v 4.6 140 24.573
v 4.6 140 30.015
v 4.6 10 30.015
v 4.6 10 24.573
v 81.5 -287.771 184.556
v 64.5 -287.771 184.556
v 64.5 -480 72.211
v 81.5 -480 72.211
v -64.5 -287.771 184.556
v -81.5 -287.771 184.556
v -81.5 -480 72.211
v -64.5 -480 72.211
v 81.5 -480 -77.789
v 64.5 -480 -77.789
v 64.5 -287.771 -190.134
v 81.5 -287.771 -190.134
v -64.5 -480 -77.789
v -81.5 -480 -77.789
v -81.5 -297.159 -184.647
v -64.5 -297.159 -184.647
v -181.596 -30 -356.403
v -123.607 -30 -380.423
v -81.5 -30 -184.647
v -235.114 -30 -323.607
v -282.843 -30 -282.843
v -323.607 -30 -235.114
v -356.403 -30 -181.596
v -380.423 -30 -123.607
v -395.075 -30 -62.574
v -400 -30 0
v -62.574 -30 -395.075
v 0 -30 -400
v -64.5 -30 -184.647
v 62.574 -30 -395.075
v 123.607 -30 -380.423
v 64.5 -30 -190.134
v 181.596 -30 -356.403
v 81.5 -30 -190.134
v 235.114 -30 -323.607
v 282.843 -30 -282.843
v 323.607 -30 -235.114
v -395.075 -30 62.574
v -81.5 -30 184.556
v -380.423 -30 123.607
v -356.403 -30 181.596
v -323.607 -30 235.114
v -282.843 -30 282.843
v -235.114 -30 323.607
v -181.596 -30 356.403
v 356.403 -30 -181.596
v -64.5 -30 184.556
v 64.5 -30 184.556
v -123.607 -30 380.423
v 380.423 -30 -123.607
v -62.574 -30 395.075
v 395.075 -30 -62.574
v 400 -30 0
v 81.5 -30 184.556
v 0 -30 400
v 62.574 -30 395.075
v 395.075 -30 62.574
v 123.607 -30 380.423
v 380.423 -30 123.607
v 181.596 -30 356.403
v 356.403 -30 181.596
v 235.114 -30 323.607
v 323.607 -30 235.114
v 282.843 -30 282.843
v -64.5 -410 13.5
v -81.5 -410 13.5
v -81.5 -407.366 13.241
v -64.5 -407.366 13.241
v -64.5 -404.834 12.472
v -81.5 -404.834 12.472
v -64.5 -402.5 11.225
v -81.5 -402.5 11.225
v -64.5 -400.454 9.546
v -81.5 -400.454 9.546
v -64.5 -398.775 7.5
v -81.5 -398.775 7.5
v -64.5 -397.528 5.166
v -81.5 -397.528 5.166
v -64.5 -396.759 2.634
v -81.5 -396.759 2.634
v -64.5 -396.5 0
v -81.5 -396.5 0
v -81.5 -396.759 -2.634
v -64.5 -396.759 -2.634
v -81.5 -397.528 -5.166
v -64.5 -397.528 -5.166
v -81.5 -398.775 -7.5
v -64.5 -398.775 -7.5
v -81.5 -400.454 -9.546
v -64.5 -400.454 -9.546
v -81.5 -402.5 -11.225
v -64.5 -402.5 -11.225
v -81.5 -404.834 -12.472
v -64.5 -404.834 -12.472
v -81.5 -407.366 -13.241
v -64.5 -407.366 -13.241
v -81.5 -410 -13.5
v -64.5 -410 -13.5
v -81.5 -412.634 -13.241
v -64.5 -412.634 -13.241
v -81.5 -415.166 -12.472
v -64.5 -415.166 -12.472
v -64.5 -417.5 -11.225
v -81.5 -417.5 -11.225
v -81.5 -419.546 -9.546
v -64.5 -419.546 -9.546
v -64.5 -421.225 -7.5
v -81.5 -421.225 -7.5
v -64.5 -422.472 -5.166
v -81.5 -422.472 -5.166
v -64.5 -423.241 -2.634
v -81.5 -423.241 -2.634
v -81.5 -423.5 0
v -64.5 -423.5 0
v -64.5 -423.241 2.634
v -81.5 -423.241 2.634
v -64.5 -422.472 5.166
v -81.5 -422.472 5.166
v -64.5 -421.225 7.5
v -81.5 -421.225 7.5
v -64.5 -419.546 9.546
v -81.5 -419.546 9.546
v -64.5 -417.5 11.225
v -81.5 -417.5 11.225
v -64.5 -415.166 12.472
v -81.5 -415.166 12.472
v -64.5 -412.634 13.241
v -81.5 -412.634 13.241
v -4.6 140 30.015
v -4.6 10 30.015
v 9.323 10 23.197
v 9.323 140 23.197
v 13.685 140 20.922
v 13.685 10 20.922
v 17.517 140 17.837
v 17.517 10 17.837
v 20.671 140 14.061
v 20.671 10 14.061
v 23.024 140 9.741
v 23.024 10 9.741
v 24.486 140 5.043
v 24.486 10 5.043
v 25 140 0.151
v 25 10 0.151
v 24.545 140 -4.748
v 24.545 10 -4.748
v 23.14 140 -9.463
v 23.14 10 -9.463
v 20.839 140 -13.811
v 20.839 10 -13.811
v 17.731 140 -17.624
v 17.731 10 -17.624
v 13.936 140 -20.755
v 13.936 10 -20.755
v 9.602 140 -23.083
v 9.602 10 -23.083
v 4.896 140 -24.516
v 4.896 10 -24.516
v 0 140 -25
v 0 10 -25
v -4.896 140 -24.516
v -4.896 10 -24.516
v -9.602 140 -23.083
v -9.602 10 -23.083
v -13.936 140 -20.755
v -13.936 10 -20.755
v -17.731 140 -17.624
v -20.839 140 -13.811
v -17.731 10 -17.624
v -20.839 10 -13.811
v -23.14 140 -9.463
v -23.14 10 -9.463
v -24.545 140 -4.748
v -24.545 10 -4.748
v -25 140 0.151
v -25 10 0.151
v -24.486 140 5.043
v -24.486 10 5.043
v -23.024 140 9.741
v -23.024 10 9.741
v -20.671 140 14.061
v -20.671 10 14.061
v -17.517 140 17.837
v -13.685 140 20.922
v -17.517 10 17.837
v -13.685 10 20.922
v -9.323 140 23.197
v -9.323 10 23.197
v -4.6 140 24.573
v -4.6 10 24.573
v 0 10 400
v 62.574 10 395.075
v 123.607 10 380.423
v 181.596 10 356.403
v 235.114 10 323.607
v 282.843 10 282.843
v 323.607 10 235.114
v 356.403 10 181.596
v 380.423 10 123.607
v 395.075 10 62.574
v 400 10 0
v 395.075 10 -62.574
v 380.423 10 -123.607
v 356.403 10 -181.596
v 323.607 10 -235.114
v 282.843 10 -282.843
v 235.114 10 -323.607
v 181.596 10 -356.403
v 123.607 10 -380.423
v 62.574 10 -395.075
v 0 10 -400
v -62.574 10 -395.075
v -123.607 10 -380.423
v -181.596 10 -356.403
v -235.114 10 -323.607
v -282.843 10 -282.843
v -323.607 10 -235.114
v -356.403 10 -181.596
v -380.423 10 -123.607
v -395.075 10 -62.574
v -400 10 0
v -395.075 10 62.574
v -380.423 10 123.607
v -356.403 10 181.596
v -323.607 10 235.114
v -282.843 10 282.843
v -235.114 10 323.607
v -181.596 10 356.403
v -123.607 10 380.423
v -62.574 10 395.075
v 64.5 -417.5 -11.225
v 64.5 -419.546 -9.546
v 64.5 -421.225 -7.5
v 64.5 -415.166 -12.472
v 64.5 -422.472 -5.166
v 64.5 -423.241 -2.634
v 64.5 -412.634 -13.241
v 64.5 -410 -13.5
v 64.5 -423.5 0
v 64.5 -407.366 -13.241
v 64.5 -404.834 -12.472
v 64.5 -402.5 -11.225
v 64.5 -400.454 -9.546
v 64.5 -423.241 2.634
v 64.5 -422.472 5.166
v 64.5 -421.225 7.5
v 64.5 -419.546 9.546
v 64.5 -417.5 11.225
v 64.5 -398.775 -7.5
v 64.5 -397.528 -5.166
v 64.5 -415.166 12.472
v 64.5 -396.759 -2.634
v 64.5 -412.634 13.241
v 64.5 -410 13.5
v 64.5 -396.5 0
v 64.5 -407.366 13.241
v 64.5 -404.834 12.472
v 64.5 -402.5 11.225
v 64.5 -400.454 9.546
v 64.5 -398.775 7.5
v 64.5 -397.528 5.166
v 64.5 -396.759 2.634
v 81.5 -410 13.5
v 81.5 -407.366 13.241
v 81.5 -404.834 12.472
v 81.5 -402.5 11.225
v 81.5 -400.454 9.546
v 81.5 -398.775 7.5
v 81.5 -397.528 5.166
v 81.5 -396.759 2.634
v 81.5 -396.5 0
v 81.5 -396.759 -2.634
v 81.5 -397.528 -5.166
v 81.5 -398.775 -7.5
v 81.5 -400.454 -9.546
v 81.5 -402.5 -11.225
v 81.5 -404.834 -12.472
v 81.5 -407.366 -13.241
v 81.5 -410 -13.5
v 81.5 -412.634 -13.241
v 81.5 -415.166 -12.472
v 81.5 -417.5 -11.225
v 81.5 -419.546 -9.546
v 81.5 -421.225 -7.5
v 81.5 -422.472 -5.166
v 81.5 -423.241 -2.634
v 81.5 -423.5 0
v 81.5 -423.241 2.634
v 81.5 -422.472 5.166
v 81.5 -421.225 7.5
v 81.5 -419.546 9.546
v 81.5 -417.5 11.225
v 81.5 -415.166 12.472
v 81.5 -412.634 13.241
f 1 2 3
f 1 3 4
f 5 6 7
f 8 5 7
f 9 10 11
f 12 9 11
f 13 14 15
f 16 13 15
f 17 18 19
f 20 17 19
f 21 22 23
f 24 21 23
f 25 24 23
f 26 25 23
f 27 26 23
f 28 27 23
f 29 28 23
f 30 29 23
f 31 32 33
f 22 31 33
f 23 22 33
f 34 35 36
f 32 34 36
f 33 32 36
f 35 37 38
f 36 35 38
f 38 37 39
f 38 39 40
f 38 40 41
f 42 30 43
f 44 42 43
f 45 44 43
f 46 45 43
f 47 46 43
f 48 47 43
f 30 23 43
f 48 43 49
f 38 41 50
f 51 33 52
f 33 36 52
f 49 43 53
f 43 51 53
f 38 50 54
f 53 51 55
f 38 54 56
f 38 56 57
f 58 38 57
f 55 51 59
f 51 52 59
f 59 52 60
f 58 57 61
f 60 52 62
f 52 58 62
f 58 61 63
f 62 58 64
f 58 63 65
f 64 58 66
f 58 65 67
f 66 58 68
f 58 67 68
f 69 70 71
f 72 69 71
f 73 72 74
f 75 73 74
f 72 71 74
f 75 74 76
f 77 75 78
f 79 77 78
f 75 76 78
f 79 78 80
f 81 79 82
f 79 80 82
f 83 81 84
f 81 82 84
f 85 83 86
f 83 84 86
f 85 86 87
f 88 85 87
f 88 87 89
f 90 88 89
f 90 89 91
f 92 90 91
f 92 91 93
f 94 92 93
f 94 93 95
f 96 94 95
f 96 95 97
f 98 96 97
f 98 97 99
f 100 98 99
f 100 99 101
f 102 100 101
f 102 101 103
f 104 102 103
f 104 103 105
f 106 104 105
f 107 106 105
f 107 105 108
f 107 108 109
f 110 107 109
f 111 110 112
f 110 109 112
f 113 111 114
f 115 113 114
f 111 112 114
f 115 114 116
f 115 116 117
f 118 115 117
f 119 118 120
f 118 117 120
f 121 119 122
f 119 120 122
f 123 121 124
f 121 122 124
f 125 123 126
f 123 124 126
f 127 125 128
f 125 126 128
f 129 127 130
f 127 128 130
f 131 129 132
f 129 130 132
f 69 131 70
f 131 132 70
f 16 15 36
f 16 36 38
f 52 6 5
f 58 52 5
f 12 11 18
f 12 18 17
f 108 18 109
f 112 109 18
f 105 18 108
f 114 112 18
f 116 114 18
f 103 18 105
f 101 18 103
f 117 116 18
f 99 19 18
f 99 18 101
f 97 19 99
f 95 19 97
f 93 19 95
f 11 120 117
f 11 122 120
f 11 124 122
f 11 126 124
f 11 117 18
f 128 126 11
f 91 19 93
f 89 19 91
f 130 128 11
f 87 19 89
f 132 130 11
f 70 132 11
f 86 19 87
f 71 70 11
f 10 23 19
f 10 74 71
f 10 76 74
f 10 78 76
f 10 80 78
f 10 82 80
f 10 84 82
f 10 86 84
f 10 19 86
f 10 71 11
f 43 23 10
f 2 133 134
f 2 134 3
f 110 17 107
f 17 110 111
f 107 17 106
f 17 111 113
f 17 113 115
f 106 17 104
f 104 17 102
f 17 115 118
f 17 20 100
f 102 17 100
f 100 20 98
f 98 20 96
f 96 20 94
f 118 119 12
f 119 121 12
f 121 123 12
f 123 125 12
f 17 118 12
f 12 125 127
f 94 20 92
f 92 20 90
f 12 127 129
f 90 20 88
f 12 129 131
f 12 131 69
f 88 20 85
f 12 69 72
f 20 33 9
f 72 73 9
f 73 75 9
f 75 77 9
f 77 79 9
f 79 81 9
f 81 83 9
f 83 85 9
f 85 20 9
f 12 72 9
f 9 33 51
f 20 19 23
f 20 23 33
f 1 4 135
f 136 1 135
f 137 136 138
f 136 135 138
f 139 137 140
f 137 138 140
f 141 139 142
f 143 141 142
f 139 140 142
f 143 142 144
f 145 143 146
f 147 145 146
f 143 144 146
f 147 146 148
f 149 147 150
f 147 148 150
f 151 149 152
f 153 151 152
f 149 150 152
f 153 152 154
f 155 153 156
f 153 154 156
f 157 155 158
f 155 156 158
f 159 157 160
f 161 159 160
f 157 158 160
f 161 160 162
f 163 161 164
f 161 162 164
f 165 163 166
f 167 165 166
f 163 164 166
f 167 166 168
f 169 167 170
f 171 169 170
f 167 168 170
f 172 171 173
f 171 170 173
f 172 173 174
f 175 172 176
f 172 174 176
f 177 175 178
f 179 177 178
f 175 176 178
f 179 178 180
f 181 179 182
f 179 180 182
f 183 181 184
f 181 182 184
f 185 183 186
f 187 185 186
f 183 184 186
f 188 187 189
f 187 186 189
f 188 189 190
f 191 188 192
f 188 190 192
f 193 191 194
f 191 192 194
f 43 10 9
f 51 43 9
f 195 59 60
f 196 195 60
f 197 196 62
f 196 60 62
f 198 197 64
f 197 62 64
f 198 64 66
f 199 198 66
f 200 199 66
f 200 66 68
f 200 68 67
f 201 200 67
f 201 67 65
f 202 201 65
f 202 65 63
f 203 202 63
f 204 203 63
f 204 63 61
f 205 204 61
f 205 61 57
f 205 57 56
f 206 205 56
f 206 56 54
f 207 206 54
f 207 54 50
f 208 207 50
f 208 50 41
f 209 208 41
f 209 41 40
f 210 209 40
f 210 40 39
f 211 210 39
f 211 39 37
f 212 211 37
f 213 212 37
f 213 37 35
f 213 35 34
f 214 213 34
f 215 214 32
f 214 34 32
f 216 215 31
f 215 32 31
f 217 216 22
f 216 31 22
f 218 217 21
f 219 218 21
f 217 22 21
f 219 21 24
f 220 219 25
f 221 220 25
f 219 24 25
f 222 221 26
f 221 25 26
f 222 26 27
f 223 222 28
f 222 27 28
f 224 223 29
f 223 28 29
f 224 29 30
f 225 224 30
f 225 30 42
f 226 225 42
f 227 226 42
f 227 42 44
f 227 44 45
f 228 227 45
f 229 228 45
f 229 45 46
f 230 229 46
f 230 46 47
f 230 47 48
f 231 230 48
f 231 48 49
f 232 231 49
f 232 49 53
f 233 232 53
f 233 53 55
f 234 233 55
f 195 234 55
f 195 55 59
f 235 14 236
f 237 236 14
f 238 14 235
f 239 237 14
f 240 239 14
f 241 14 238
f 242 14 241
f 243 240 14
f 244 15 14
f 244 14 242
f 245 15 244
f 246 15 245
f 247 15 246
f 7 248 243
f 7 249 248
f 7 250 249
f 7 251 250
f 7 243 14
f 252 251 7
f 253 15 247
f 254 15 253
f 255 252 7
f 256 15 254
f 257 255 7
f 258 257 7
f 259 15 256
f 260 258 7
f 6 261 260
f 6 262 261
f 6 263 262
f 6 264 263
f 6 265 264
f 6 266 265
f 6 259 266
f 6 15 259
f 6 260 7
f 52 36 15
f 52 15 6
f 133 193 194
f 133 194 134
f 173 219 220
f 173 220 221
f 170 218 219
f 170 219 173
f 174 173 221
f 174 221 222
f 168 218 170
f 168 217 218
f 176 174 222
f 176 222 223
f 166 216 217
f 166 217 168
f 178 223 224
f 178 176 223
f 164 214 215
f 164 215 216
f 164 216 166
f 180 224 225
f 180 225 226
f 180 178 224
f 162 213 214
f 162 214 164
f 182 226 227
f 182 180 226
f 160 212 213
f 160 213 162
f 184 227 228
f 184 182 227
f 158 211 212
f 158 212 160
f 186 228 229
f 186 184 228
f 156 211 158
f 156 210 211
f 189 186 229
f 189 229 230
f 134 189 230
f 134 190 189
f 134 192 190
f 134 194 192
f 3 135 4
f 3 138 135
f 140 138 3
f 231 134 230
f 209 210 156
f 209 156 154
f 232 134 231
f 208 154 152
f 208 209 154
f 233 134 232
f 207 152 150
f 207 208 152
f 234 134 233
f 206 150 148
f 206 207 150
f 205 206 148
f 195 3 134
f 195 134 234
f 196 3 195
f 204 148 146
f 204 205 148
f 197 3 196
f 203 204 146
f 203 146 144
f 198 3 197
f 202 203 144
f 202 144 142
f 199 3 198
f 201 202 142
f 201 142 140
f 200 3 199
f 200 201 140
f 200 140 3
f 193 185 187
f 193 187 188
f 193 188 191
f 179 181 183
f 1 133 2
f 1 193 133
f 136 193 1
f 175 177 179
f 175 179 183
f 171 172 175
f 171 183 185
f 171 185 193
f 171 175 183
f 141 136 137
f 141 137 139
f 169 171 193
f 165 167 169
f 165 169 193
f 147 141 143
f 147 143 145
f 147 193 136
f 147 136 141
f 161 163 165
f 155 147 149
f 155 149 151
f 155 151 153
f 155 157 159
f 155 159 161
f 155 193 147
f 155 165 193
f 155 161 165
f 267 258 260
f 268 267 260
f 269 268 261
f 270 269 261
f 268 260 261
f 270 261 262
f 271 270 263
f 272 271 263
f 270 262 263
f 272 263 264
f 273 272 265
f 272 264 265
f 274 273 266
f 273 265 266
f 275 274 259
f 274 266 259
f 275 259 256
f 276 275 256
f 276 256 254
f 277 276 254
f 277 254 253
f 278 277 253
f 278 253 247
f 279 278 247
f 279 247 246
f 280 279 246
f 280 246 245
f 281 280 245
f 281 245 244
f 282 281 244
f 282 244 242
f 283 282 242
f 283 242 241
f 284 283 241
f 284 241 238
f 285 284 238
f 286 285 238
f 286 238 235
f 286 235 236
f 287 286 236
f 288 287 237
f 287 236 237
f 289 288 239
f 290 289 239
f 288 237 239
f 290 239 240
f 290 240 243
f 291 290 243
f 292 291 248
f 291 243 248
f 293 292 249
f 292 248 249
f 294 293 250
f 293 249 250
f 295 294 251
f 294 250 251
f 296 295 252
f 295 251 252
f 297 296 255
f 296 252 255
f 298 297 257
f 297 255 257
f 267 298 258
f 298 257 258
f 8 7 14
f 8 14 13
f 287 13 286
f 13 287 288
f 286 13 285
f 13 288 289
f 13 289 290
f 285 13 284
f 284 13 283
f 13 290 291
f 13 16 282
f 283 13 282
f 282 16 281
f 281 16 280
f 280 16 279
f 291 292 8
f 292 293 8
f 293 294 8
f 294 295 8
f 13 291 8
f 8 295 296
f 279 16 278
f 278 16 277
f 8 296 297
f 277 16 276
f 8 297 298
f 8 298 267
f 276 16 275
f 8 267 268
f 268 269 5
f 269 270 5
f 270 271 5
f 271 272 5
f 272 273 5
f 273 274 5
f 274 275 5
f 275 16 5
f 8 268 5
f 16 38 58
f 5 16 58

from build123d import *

# Parameters (mm, degrees)
SKETCH1_R               = 400
BOSS_EXTRUDE1_DEPTH     = 10
BOSS_EXTRUDE5_DEPTH     = 130
BOSS_EXTRUDE6_START     = -30
SKETCH1_4_R             = 400
BOSS_EXTRUDE6_DEPTH     = 30
SKETCH4_W               = 17
SKETCH4_H               = 369.202632894
SKETCH4_H_2             = 374.689720856
BOSS_EXTRUDE7_DEPTH     = 450
CUT_EXTRUDE1_DEPTH      = 789.823332566
CUT_EXTRUDE1_DEPTH_BACK = 300
SKETCH6_R               = 13.5
CUT_EXTRUDE2_DEPTH      = 300


with BuildPart() as part:
    # Sketch1 → Boss-Extrude1 (new body)
    with BuildSketch(Plane(origin=(0, 0, 0), x_dir=(1, 0, 0), z_dir=(0, 1, 0))):
        Circle(SKETCH1_R)
    extrude(amount=BOSS_EXTRUDE1_DEPTH)

    # Sketch3 → Boss-Extrude5 (add)
    with BuildSketch(Plane(origin=(0, 10, 0), x_dir=(1, 0, 0), z_dir=(0, 1, 0))):
        with BuildLine():
            Line((-4.6, -30.015), (4.6, -30.015))
            Line((4.6, -30.015), (4.6, -24.573156085))
            ThreePointArc((4.6, -24.573156085), (0, 25), (-4.6, -24.573156085))
            Line((-4.6, -24.573156085), (-4.6, -30.015))
        make_face()
    extrude(amount=BOSS_EXTRUDE5_DEPTH)

    # Sketch1<4> → Boss-Extrude6 (add)
    with BuildSketch(Plane(origin=(0, 0, 0), x_dir=(1, 0, 0), z_dir=(0, 1, 0)).offset(BOSS_EXTRUDE6_START)):
        Circle(SKETCH1_4_R)
    extrude(amount=BOSS_EXTRUDE6_DEPTH)

    # Sketch4 → Boss-Extrude7 (add)
    with BuildSketch(Plane.XZ.offset(30)):
        with Locations((-73, -0.045418377)):
            Rectangle(SKETCH4_W, SKETCH4_H)
        with Locations((73, -2.788962358)):
            Rectangle(SKETCH4_W, SKETCH4_H_2)
    extrude(amount=BOSS_EXTRUDE7_DEPTH)

    # Sketch5 → Cut-Extrude1 (cut, two sides: drawn at the far end of the back side and taken through both)
    with BuildSketch(Plane(origin=(81.5, 0, 0), x_dir=(0, 0, -1), z_dir=(1, 0, 0)).offset(-CUT_EXTRUDE1_DEPTH_BACK)):
        Polygon((-184.55589807, -287.770569758), (-72.211037642, -480), (-184.55589807, -480), align=None)
        Polygon((77.788962358, -480), (190.133822786, -287.770569758), (190.133822786, -480), align=None)
    extrude(amount=CUT_EXTRUDE1_DEPTH + CUT_EXTRUDE1_DEPTH_BACK, mode=Mode.SUBTRACT)

    # Sketch6 → Cut-Extrude2 (cut)
    with BuildSketch(Plane.ZY.offset(81.5)):
        with Locations((0, -410)):
            Circle(SKETCH6_R)
    extrude(amount=-CUT_EXTRUDE2_DEPTH, mode=Mode.SUBTRACT)


solid = part.part
